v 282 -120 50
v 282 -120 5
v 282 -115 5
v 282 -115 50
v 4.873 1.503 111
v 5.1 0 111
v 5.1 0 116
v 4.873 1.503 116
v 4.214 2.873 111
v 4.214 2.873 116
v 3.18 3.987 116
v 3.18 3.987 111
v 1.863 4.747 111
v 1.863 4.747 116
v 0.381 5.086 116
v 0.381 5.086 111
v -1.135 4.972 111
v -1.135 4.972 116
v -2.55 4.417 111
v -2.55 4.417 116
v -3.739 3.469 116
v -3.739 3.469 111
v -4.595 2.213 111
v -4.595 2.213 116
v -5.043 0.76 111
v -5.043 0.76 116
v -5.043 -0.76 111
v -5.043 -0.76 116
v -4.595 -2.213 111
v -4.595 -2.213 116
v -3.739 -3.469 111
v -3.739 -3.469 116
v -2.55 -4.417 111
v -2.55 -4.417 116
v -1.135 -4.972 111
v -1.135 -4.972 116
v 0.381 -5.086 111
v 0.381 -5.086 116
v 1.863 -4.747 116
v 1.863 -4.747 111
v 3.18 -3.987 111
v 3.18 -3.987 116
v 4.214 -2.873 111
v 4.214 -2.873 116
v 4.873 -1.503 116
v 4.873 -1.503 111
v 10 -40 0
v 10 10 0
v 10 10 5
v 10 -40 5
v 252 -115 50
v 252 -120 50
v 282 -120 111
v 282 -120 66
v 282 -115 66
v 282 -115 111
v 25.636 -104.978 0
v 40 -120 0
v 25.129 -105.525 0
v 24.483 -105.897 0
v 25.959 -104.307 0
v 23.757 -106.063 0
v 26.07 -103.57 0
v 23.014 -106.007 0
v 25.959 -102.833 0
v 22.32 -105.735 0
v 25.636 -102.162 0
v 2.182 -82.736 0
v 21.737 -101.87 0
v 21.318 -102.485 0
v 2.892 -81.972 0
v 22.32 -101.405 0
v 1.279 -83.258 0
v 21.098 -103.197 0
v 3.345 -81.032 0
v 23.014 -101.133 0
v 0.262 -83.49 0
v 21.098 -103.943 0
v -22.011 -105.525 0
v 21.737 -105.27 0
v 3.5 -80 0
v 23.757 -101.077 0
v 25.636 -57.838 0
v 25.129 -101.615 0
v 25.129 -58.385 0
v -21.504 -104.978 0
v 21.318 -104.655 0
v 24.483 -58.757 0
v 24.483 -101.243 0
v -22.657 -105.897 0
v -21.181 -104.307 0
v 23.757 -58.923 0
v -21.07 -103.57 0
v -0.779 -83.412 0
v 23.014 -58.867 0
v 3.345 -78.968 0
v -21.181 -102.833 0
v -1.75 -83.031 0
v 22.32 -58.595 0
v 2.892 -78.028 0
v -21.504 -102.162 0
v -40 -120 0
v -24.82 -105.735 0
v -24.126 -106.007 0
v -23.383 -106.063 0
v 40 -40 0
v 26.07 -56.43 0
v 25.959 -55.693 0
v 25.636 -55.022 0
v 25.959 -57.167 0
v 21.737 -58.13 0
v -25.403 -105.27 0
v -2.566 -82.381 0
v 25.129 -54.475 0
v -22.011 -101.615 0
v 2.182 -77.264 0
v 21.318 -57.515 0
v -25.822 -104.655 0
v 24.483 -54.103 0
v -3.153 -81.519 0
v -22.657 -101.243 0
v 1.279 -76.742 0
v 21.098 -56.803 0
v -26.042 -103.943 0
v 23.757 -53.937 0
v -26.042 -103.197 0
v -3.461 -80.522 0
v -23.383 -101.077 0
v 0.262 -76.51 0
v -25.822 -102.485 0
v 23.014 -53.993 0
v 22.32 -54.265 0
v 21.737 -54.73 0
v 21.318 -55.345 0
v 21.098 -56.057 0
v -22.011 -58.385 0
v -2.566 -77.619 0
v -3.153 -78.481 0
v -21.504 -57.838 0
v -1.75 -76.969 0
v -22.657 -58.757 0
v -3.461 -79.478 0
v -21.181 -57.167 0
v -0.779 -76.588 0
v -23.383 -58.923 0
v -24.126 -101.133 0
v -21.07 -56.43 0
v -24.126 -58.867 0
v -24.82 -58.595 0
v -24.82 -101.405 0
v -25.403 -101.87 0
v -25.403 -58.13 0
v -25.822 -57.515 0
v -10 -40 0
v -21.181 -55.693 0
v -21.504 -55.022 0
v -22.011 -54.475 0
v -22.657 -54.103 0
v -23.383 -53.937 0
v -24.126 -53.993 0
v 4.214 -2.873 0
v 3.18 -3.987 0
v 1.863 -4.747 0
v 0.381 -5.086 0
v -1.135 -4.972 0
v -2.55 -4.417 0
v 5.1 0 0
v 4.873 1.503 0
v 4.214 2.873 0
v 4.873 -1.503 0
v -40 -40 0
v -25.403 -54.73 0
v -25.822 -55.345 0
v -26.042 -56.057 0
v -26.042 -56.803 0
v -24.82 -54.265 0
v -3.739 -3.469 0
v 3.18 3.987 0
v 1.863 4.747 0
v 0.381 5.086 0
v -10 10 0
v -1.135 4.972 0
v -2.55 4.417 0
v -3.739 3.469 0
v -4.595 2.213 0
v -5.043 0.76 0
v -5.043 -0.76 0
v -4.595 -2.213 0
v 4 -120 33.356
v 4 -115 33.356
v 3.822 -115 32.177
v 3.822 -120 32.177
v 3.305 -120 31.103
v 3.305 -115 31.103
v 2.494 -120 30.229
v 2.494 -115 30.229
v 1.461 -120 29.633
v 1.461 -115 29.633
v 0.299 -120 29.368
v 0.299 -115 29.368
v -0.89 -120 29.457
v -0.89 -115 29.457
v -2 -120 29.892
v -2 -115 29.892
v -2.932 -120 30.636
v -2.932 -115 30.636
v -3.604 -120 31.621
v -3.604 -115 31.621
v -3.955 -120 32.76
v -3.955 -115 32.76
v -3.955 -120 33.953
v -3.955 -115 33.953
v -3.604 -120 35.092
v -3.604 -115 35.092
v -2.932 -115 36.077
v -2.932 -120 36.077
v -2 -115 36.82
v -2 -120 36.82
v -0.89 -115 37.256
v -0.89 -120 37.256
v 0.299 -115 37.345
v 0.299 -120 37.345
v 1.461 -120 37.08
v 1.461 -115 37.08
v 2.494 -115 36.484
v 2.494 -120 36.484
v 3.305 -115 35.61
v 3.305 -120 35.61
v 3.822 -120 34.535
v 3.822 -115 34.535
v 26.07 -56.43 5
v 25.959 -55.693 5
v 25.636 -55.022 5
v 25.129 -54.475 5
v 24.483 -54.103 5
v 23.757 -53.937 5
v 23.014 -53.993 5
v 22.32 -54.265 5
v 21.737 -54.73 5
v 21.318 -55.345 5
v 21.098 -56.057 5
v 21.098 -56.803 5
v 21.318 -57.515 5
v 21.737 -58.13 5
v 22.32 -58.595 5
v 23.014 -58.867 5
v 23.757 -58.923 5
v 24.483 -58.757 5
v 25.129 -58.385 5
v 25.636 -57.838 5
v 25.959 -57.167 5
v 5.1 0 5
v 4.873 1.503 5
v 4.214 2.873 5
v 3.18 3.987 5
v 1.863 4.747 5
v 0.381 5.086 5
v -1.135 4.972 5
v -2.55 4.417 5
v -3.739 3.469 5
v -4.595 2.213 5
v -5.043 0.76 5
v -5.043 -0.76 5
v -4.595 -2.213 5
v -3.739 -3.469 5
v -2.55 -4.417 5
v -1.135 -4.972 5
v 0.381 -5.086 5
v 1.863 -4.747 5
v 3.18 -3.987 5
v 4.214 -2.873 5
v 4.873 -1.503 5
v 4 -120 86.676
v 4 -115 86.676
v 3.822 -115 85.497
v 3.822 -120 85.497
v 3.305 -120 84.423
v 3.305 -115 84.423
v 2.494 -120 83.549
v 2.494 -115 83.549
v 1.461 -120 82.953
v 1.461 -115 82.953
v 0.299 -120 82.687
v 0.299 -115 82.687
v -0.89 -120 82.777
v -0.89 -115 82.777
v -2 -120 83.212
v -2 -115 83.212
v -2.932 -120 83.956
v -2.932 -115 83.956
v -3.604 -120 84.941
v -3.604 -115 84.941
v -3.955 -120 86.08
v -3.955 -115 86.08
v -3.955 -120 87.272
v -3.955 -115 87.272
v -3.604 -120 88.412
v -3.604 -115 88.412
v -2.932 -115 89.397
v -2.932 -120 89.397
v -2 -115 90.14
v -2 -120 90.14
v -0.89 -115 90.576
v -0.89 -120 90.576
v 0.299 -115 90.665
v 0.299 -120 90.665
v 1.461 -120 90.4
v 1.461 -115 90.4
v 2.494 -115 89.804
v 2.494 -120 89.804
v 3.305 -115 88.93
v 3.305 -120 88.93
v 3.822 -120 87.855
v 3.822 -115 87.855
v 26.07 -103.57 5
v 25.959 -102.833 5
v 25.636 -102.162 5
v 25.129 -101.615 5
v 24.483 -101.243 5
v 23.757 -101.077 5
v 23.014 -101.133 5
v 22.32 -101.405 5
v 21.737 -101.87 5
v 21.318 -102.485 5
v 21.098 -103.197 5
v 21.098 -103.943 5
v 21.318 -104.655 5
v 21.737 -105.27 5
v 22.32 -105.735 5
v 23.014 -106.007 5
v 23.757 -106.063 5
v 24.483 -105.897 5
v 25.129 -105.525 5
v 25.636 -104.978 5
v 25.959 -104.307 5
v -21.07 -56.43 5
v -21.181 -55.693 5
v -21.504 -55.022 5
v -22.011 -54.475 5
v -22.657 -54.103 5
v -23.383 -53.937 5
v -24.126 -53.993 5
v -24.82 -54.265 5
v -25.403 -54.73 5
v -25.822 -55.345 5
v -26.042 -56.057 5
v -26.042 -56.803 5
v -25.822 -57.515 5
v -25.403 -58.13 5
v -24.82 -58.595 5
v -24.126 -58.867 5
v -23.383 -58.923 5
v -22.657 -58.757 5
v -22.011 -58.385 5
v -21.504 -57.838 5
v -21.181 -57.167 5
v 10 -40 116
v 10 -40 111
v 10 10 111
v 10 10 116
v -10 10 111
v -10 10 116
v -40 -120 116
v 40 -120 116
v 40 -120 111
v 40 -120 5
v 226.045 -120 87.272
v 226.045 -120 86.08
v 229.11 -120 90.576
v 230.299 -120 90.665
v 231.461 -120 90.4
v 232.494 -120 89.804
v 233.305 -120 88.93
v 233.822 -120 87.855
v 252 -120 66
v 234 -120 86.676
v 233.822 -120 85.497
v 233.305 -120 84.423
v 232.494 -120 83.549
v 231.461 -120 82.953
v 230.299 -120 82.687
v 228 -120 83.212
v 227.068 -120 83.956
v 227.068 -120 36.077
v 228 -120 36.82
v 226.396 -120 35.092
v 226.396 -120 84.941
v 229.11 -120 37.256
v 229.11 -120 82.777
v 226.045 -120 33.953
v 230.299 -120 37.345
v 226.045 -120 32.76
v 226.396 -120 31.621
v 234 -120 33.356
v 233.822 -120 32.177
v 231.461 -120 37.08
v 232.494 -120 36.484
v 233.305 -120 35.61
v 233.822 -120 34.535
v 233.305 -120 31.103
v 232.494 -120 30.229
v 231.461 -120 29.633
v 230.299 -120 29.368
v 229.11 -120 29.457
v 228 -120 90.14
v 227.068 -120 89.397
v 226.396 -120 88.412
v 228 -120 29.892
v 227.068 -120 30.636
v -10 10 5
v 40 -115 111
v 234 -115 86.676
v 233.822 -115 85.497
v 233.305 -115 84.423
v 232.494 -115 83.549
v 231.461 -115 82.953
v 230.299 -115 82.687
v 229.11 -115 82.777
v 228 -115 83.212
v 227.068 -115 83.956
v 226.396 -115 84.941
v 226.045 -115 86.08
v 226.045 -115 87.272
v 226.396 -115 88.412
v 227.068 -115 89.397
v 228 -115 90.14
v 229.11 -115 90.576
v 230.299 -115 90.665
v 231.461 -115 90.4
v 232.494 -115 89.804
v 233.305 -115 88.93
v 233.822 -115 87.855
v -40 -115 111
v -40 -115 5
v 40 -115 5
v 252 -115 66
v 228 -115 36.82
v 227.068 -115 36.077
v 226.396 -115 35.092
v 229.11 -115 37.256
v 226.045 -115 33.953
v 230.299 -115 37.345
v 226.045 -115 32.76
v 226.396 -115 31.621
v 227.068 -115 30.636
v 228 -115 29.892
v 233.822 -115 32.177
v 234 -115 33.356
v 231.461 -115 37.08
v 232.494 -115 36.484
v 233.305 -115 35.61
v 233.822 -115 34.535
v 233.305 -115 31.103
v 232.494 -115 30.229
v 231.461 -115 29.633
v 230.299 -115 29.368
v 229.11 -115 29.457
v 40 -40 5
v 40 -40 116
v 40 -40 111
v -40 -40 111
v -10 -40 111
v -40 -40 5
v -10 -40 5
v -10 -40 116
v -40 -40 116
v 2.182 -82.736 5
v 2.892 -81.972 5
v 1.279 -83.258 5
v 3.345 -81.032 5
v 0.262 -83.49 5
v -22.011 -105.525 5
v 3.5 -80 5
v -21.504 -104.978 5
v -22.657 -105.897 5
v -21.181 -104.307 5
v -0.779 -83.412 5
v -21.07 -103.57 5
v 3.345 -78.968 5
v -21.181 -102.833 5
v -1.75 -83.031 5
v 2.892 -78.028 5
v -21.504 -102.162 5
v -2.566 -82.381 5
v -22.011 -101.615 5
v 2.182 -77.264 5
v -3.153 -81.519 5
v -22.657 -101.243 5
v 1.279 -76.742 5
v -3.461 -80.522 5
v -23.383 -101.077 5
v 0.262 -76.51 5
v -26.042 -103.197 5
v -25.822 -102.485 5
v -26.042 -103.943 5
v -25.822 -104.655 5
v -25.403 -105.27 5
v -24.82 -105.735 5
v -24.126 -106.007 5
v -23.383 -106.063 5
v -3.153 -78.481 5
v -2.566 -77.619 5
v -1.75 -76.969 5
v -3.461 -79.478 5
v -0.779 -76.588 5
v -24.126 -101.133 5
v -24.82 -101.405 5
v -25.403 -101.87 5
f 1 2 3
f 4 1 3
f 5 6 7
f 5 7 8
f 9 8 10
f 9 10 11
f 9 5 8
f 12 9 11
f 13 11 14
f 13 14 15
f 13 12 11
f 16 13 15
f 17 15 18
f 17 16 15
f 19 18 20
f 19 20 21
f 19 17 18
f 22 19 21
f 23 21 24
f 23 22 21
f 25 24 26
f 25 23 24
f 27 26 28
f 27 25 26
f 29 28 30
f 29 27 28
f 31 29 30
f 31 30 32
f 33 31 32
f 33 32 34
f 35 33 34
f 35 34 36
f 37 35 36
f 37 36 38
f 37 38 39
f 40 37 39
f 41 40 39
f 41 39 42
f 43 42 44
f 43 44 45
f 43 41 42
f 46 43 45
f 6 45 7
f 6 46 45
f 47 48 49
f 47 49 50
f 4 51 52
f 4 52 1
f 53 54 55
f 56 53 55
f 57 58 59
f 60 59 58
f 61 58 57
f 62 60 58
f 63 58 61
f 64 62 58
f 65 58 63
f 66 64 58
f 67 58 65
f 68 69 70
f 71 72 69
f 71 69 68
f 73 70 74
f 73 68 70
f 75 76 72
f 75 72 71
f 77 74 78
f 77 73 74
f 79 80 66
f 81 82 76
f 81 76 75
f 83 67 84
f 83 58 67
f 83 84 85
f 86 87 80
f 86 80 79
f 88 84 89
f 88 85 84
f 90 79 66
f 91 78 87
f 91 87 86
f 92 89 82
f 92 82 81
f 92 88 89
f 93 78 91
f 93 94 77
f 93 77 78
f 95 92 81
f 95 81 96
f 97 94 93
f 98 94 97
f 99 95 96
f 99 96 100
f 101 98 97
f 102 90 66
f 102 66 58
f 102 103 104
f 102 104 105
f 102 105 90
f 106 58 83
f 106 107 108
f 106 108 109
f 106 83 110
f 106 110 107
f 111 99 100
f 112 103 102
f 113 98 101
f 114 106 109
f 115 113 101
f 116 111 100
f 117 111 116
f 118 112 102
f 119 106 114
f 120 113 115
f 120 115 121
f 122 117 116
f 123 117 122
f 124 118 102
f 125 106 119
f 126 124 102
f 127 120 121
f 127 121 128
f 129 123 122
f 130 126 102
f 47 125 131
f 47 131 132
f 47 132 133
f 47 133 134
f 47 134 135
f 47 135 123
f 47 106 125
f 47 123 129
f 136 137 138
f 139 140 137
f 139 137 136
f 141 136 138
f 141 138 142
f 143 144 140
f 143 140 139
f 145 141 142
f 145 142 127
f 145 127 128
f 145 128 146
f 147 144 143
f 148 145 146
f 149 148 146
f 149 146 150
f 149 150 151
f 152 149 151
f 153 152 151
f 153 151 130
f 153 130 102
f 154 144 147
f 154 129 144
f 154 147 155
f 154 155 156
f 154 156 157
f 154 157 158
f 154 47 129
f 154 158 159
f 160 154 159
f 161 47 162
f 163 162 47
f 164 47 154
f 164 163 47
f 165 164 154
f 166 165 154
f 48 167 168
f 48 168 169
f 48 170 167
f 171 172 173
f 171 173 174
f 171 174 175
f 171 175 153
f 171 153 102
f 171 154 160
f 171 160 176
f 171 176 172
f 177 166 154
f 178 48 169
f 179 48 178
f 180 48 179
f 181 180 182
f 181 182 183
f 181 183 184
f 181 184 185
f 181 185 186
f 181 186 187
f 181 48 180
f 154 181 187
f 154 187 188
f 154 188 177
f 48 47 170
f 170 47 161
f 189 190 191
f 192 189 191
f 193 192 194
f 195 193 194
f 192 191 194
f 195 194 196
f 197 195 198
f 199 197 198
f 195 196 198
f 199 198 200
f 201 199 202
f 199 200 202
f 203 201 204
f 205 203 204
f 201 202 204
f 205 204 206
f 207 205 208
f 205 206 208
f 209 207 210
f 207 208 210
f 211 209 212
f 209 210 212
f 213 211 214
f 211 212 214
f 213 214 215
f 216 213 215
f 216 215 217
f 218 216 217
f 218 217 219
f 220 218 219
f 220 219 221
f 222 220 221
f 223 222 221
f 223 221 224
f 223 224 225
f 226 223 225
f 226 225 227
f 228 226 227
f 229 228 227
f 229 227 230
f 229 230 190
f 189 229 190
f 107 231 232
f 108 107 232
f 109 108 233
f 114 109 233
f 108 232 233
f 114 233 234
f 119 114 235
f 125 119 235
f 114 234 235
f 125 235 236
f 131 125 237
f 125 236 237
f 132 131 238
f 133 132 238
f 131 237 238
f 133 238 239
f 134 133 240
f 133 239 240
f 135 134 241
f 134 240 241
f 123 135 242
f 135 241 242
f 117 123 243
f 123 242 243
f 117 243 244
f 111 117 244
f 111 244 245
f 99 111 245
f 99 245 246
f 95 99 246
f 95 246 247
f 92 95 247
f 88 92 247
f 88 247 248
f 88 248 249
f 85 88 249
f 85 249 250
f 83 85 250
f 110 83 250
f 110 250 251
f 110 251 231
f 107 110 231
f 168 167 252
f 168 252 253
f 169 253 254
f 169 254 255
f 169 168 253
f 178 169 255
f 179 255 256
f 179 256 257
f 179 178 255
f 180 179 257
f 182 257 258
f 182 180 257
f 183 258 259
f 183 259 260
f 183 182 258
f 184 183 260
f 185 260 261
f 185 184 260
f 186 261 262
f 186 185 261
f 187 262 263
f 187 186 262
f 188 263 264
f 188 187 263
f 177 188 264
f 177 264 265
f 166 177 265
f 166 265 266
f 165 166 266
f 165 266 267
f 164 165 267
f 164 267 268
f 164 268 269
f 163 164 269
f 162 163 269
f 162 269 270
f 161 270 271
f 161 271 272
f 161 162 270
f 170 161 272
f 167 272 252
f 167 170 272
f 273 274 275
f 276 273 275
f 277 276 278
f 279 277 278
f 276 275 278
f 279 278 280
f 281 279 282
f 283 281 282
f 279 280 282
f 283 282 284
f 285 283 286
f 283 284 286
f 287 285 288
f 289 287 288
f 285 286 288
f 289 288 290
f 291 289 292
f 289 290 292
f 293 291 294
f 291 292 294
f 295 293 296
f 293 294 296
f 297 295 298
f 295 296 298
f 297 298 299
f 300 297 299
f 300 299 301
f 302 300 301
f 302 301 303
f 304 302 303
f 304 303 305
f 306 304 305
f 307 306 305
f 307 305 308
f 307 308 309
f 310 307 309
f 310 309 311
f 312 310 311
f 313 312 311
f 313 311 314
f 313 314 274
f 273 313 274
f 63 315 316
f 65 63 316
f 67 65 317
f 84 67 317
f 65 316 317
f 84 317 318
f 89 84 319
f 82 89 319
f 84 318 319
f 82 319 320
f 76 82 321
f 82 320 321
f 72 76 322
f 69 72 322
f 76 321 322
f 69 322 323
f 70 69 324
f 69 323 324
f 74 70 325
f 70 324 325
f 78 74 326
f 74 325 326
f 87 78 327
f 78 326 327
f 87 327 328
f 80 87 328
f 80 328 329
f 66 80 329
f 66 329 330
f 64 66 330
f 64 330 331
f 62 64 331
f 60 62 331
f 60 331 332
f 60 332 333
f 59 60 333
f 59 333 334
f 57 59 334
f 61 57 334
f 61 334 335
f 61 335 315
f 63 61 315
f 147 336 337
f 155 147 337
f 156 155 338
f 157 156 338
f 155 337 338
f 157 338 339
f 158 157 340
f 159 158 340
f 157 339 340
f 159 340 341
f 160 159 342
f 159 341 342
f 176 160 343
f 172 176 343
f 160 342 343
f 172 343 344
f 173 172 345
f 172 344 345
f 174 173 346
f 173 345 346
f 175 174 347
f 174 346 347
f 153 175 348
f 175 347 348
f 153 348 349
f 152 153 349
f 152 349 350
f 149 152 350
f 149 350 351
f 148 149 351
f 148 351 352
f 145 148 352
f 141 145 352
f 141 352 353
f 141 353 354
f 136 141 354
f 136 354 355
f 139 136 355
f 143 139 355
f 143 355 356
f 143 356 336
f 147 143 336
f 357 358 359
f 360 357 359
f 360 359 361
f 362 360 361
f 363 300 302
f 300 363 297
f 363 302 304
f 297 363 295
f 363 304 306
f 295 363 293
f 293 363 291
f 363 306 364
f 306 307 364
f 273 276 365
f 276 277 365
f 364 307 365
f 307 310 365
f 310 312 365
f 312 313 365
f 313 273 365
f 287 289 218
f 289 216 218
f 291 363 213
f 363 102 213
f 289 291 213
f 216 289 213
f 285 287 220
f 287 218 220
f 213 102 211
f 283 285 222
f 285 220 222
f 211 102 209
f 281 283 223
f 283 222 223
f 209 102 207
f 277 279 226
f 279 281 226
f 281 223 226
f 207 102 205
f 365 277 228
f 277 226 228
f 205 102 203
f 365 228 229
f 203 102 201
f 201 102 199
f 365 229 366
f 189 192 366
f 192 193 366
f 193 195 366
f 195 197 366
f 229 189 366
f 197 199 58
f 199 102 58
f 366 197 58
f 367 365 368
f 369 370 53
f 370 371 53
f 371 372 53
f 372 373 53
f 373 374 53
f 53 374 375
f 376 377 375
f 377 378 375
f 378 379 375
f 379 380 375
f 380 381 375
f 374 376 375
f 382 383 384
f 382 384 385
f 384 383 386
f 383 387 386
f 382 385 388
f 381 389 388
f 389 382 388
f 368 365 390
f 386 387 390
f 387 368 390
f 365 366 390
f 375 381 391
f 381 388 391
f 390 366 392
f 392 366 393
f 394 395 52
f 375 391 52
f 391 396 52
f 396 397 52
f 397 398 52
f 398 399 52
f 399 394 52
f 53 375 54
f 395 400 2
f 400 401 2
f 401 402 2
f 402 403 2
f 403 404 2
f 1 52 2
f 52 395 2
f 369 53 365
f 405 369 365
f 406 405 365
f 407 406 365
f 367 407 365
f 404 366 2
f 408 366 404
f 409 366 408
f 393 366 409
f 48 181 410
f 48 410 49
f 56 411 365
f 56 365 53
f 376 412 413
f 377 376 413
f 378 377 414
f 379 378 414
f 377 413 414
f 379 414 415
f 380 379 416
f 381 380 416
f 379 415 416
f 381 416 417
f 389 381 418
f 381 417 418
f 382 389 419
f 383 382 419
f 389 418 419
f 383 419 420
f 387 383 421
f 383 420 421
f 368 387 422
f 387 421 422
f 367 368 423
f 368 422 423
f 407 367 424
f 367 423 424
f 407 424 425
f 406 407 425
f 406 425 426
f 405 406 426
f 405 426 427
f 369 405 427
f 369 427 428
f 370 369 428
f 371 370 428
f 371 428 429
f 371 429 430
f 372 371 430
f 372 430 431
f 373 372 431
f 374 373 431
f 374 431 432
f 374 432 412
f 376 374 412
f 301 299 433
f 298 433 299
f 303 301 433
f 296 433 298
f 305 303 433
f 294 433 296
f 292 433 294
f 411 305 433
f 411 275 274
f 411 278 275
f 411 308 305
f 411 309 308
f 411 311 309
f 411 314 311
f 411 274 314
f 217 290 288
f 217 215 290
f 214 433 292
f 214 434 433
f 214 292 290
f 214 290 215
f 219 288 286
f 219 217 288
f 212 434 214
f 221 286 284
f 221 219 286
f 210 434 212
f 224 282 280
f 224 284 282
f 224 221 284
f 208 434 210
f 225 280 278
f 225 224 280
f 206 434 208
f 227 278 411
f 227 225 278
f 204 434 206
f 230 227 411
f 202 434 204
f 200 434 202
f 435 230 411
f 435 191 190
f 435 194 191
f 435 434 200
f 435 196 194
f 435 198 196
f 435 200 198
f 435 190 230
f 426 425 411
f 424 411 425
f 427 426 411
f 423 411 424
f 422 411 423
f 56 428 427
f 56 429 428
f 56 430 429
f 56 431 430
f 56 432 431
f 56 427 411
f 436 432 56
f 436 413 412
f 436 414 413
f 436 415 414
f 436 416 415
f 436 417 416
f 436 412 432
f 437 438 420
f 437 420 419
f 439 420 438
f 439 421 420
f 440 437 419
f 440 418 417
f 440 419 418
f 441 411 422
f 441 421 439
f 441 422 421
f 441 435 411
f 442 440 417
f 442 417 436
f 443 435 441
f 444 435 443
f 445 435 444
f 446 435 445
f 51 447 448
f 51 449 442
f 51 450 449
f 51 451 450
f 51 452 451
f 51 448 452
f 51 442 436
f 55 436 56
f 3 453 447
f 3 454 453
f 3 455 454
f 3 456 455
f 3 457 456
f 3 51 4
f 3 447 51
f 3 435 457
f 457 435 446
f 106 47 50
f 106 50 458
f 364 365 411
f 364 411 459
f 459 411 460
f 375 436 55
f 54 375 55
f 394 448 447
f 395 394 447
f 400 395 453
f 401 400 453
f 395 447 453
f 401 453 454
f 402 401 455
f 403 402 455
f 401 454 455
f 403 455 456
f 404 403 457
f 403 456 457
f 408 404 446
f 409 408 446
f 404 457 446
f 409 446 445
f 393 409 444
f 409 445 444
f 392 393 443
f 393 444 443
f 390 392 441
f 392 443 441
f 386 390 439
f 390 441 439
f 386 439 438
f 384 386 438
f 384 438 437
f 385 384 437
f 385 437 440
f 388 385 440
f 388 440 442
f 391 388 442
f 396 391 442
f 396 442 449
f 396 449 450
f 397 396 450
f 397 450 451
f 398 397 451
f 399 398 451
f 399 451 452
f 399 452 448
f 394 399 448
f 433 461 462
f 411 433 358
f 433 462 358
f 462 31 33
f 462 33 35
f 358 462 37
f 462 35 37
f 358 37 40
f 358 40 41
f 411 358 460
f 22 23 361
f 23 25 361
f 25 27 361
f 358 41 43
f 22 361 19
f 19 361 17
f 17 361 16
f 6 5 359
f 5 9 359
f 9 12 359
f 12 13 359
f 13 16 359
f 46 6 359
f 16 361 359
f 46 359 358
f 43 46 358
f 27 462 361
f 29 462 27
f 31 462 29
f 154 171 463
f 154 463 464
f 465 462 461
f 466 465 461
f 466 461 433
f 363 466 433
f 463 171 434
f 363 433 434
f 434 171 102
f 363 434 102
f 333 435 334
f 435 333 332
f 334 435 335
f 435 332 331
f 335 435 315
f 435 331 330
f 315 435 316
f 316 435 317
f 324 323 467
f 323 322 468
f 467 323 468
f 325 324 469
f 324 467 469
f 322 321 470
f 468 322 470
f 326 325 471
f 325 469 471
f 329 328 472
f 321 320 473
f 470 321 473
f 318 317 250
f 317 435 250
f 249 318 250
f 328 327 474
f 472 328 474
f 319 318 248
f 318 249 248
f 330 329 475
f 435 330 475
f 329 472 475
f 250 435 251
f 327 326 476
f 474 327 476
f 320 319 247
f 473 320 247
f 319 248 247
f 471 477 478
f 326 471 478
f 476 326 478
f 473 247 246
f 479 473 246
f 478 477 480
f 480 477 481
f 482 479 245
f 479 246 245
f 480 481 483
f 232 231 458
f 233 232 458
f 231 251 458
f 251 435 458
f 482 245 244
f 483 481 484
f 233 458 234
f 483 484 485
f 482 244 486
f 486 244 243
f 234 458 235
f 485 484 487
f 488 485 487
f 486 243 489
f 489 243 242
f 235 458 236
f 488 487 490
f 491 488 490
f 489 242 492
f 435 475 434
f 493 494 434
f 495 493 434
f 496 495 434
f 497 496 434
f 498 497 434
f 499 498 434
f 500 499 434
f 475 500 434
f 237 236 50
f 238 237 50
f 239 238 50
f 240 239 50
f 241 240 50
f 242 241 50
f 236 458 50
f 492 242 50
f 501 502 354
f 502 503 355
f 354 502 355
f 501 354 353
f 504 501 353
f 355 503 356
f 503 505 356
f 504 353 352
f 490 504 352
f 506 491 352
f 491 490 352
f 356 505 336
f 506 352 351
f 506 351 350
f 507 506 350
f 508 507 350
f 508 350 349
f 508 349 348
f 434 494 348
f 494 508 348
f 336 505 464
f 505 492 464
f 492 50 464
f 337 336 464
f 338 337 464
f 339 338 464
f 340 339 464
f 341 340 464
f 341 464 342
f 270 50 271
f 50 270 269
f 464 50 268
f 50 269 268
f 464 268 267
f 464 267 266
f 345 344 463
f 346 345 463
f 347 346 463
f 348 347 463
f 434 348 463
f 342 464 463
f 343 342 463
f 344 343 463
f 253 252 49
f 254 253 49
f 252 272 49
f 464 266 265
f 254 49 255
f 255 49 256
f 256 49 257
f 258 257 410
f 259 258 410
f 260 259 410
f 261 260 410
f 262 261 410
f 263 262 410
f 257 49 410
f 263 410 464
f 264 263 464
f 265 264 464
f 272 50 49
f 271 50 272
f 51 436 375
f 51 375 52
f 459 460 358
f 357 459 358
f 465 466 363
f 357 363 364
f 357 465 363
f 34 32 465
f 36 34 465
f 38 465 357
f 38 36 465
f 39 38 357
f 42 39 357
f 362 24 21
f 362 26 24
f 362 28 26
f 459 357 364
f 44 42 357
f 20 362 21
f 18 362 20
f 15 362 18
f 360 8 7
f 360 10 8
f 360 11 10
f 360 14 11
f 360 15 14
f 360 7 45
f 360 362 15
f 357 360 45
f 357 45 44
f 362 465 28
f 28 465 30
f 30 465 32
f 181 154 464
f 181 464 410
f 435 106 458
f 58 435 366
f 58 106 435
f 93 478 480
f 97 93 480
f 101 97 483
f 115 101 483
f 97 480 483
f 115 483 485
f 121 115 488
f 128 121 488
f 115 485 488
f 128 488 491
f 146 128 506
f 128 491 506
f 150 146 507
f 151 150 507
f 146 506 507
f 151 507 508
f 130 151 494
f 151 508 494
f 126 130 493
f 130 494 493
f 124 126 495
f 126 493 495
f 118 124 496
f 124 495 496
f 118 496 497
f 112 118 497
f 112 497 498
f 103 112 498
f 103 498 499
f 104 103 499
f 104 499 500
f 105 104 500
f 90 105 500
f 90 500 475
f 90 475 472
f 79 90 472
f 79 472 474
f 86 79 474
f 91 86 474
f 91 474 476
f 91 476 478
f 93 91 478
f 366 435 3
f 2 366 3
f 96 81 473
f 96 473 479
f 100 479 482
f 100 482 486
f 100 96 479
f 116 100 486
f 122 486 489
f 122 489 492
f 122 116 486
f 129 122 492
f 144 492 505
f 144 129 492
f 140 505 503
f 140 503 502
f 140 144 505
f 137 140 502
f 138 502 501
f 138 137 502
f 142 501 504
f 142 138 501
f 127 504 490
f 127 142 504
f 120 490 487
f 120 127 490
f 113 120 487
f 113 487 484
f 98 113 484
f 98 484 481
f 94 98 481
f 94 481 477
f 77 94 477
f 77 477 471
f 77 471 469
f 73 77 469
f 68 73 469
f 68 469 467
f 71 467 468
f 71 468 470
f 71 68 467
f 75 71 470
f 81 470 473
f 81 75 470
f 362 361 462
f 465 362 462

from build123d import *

# Parameters (mm, degrees)
SKETCH1_R           = 5.1
SKETCH1_R_2         = 3.5
BOSS_EXTRUDE2_DEPTH = 5
SKETCH2_R           = 2.5
CUT_EXTRUDE1_DEPTH  = 10
SKETCH3_W           = 322
SKETCH3_H           = 5
BOSS_EXTRUDE3_DEPTH = 106
SKETCH4_R           = 5.1
BOSS_EXTRUDE4_DEPTH = 5
SKETCH5_R           = 4
SKETCH5_W           = 30
SKETCH5_H           = 16
CUT_EXTRUDE2_DEPTH  = 10


with BuildPart() as part:
    # Sketch1 → Boss-Extrude2 (new body)
    with BuildSketch(Plane.XY):
        Polygon((-40, -40), (-10, -40), (-10, 10), (10, 10), (10, -40), (40, -40), (40, -120), (-40, -120), align=None)
        Circle(SKETCH1_R, mode=Mode.SUBTRACT)
        with Locations((0, -80)):
            Circle(SKETCH1_R_2, mode=Mode.SUBTRACT)
    extrude(amount=BOSS_EXTRUDE2_DEPTH)

    # Sketch2 → Cut-Extrude1 (cut)
    with BuildSketch(Plane.XY.offset(5)):
        with Locations((-23.57, -56.43)):
            Circle(SKETCH2_R)
        with Locations((23.57, -56.43)):
            Circle(SKETCH2_R)
        with Locations((-23.57, -103.57)):
            Circle(SKETCH2_R)
        with Locations((23.57, -103.57)):
            Circle(SKETCH2_R)
    extrude(amount=-CUT_EXTRUDE1_DEPTH, mode=Mode.SUBTRACT)

    # Sketch3 → Boss-Extrude3 (add)
    with BuildSketch(Plane.XY.offset(5)):
        with Locations((121, -117.5)):
            Rectangle(SKETCH3_W, SKETCH3_H)
    extrude(amount=BOSS_EXTRUDE3_DEPTH)

    # Sketch4 → Boss-Extrude4 (add)
    with BuildSketch(Plane.XY.offset(111)):
        Polygon((-40, -115), (-40, -120), (40, -120), (40, -115), (40, -40), (10, -40), (10, 10), (-10, 10), (-10, -40), (-40, -40), align=None)
        Circle(SKETCH4_R, mode=Mode.SUBTRACT)
    extrude(amount=BOSS_EXTRUDE4_DEPTH)

    # Sketch5 → Cut-Extrude2 (cut)
    with BuildSketch(Plane(origin=(0, -115, 0), x_dir=(1, 0, 0), z_dir=(0, 1, 0))):
        with Locations((0, -33.356338746)):
            Circle(SKETCH5_R)
        with Locations((0, -86.676260369)):
            Circle(SKETCH5_R)
        with Locations((230, -86.676260369)):
            Circle(SKETCH5_R)
        with Locations((230, -33.356338746)):
            Circle(SKETCH5_R)
        with Locations((267, -58)):
            Rectangle(SKETCH5_W, SKETCH5_H)
    extrude(amount=-CUT_EXTRUDE2_DEPTH, mode=Mode.SUBTRACT)


solid = part.part
